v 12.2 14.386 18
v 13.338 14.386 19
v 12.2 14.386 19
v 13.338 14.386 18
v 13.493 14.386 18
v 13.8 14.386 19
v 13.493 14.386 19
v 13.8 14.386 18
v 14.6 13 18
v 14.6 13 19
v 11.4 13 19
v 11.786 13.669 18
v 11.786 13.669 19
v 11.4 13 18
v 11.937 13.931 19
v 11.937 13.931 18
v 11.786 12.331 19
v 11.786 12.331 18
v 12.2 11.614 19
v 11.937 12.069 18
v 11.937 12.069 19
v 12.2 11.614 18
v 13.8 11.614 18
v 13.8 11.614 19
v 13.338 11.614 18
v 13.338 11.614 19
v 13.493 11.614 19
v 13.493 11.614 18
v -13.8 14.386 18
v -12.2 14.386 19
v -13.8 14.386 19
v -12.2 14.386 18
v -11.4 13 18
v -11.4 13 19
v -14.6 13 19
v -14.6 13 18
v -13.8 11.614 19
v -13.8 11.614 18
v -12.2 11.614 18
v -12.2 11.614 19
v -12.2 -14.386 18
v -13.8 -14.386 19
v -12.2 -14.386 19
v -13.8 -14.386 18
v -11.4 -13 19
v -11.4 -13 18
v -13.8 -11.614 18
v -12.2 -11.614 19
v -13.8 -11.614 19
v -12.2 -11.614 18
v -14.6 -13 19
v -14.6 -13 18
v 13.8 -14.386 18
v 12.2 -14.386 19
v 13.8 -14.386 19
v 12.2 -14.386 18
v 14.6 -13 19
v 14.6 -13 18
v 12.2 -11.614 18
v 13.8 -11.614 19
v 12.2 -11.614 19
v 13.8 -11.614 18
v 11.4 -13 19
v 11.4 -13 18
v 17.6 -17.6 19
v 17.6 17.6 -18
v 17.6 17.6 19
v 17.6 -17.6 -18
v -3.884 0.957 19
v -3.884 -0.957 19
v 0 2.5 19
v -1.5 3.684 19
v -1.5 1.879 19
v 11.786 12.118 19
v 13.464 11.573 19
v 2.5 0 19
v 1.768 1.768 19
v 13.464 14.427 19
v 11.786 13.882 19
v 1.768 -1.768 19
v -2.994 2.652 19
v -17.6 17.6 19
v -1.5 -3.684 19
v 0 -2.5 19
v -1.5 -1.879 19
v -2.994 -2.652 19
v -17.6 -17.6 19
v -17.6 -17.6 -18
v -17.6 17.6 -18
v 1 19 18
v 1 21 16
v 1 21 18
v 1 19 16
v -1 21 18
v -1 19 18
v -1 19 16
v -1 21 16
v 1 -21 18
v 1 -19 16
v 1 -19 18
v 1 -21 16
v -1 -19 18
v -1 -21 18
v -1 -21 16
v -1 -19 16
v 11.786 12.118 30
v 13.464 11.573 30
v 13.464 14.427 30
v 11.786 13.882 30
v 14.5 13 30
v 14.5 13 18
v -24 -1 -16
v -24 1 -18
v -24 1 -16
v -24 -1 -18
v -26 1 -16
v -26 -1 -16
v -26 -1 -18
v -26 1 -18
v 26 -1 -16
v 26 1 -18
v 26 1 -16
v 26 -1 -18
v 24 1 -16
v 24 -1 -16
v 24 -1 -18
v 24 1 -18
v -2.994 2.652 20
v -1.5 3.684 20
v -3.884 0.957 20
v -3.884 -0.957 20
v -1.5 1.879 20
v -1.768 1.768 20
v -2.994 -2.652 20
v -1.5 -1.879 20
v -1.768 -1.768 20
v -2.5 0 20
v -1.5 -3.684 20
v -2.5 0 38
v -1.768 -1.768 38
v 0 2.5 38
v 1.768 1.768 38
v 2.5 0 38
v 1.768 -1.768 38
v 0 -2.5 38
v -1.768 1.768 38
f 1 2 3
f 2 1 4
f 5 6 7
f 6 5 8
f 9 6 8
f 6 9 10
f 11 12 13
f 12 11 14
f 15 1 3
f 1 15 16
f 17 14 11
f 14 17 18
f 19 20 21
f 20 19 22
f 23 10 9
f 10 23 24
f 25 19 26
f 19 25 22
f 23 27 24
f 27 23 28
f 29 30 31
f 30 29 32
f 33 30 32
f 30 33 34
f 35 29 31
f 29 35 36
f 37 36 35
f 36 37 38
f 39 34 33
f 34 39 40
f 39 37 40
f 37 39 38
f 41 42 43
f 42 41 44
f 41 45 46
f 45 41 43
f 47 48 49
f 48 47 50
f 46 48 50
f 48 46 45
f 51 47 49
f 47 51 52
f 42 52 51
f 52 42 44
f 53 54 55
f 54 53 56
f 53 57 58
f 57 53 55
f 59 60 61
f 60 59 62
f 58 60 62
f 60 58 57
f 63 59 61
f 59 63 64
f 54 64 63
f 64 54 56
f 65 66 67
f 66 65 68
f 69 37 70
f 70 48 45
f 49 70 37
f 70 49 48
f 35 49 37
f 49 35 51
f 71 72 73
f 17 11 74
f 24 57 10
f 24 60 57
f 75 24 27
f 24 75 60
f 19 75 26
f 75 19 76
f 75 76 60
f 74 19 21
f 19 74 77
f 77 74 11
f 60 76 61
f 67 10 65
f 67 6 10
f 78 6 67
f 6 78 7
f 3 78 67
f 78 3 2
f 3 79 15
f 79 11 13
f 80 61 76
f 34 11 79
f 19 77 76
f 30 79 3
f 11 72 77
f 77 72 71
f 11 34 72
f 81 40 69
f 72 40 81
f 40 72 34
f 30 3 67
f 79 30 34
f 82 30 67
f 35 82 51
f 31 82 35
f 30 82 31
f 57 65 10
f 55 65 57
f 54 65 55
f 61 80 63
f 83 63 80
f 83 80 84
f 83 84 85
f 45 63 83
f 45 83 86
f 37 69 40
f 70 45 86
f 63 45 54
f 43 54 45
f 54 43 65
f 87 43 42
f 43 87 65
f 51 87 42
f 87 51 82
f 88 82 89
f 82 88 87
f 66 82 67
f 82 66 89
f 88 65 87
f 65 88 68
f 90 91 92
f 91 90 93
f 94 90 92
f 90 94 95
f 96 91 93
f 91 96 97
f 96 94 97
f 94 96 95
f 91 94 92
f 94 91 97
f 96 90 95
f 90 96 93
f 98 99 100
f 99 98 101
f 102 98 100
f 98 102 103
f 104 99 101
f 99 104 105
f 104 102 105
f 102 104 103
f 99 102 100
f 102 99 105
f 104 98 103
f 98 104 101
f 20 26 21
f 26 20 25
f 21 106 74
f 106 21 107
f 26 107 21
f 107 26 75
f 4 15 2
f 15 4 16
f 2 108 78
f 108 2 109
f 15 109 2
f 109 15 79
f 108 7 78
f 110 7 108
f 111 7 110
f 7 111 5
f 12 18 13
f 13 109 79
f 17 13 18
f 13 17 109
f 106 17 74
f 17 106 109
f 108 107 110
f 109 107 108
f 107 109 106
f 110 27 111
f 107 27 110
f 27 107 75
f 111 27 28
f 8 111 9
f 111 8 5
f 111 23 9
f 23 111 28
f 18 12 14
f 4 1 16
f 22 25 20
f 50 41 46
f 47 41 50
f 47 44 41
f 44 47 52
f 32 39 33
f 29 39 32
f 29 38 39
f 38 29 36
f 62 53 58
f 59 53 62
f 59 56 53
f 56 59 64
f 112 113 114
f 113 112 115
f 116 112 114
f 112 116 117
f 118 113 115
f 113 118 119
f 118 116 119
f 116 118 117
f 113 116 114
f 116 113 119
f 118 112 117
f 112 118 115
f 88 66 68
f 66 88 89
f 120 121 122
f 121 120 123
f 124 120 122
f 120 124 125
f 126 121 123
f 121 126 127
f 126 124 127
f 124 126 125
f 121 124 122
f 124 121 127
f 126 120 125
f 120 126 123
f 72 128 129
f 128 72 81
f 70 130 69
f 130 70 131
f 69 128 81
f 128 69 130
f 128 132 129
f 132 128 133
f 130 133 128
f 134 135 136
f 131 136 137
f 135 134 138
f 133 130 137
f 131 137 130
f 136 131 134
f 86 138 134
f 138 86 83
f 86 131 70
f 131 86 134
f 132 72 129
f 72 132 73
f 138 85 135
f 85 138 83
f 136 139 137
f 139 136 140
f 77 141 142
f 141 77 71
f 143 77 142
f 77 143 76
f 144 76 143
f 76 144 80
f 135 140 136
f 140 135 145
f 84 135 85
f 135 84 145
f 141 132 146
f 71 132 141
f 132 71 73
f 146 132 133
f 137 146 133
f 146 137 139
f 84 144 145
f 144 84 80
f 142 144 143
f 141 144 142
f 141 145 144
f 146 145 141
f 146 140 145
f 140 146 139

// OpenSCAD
// Parameters
face_width = 35.2; //[17.6:70.4:0.1]
body_length = 36; //[18:72:0.1]
shaft_diameter = 5; //[2.5:10:0.1]
shaft_length = 20; //[5:40:0.1]
front_face_thickness = 2; //[0.5:6:0.1]
mounting_hole_spacing = 26; //[13:52:0.1]
mounting_hole_diameter = 3.2; //[2:6:0.1]
overlap = 1; //[0.5:2:0.1]
ref_diameter = 0.8; //[0.4:2:0.1]
ref_length = 6; //[2:20:0.5]
ttrack_length = 60; //[30:120:1]
ttrack_pitch = 20; //[10:40:1]
rail_length = 80; //[40:160:1]
rail_pitch = 25; //[10:50:1]
rail_hole_count = 3; //[2:8:1]
marker_size = 2; //[1:5:0.1]
screw_shank_diameter = 3; //[2:6:0.1]
screw_length = 12; //[6:30:0.5]
washer_outer_diameter = 7; //[4:14:0.1]
washer_thickness = 1; //[0.5:3:0.1]
d_plug_diameter = 8; //[4:16:0.1]
d_plug_thickness = 2; //[1:6:0.1]
d_flat_depth = 1.5; //[0.5:4:0.1]

// Derived Z references (centered model)
z_body_front =  body_length/2;
z_plate_center = z_body_front + front_face_thickness/2 - overlap; // overlaps into body
z_plate_front  = z_plate_center + front_face_thickness/2;

// Ttrack Hole Positions (markers only; keep attached by intersecting plate/body)
module ttrack_hole_positions() {
  color("Silver")
  union() {
    translate([0, ttrack_length/2 - (ttrack_length - 2*ttrack_pitch)/2, z_body_front - marker_size/2])
      cube([marker_size, marker_size, marker_size], center=true);
    translate([0, ttrack_length/2 - (ttrack_length - 2*ttrack_pitch)/2 - ttrack_pitch, z_body_front - marker_size/2])
      cube([marker_size, marker_size, marker_size], center=true);
    translate([0, ttrack_length/2 - (ttrack_length - 2*ttrack_pitch)/2 - 2*ttrack_pitch, z_body_front - marker_size/2])
      cube([marker_size, marker_size, marker_size], center=true);
  }
}

// Screw and Washer (ensure they start inside the face plate by overlap)
module screw_and_washer() {
  color("DimGray")
  union() {
    // Screw: bottom slightly inside plate
    translate([mounting_hole_spacing/2, mounting_hole_spacing/2,
               z_plate_front + screw_length/2 - overlap])
      cylinder(r=screw_shank_diameter/2, h=screw_length, center=true);

    // Washer: slightly embedded into plate
    translate([mounting_hole_spacing/2, mounting_hole_spacing/2,
               z_plate_front - washer_thickness/2 - overlap])
      cylinder(r=washer_outer_diameter/2, h=washer_thickness, center=true);
  }
}

// Rail Hole Positions (markers only; keep attached by intersecting body)
module rail_hole_positions() {
  color("Silver")
  union() {
    translate([(-rail_pitch*(rail_hole_count-1)/2), 0, -body_length/2 + marker_size/2])
      cube([marker_size, marker_size, marker_size], center=true);
    translate([(-rail_pitch*(rail_hole_count-1)/2) + rail_pitch, 0, -body_length/2 + marker_size/2])
      cube([marker_size, marker_size, marker_size], center=true);
    translate([(-rail_pitch*(rail_hole_count-1)/2) + 2*rail_pitch, 0, -body_length/2 + marker_size/2])
      cube([marker_size, marker_size, marker_size], center=true);
  }
}

// D Plug D (secondary small cylinder/pin) - FIXED: embed into face plate so it cannot float
module d_plug_D() {
  color("Copper")
  difference() {
    // Centered so its back face penetrates the plate by 'overlap'
    translate([0, 0, z_plate_front + d_plug_thickness/2 - overlap])
      cylinder(r=d_plug_diameter/2, h=d_plug_thickness, center=true);

    // Flat cut
    translate([d_plug_diameter/2 - d_flat_depth, 0, z_plate_front + d_plug_thickness/2 - overlap])
      cube([d_plug_diameter, d_plug_diameter, d_plug_thickness + 2*overlap], center=true);
  }
}

// Ttrack Insert Hole Positions (markers only; keep attached by intersecting plate/body)
module ttrack_insert_hole_positions() {
  color("Silver")
  union() {
    translate([0, ttrack_length/2 - (ttrack_length - ttrack_pitch)/2, z_body_front - marker_size/2])
      cube([marker_size, marker_size, marker_size], center=true);
    translate([0, ttrack_length/2 - (ttrack_length - ttrack_pitch)/2 - ttrack_pitch, z_body_front - marker_size/2])
      cube([marker_size, marker_size, marker_size], center=true);
  }
}

// Motor Assembly (single connected solid via union; all parts overlap 1-2mm)
module assembly() {
  union() {

    // Motor Body
    color("Black")
      cube([face_width, face_width, body_length], center=true);

    // Front Face Plate with Holes (plate overlaps into body)
    color("Silver")
    difference() {
      translate([0, 0, z_plate_center])
        cube([face_width, face_width, front_face_thickness], center=true);

      union() {
        translate([ mounting_hole_spacing/2,  mounting_hole_spacing/2, z_plate_center])
          cylinder(r=mounting_hole_diameter/2, h=front_face_thickness + 2*overlap, center=true);
        translate([-mounting_hole_spacing/2,  mounting_hole_spacing/2, z_plate_center])
          cylinder(r=mounting_hole_diameter/2, h=front_face_thickness + 2*overlap, center=true);
        translate([-mounting_hole_spacing/2, -mounting_hole_spacing/2, z_plate_center])
          cylinder(r=mounting_hole_diameter/2, h=front_face_thickness + 2*overlap, center=true);
        translate([ mounting_hole_spacing/2, -mounting_hole_spacing/2, z_plate_center])
          cylinder(r=mounting_hole_diameter/2, h=front_face_thickness + 2*overlap, center=true);
      }
    }

    // Output Shaft (back face penetrates plate by overlap)
    color("Silver")
      translate([0, 0, z_plate_front + shaft_length/2 - overlap])
        cylinder(r=shaft_diameter/2, h=shaft_length, center=true);

    // Reference Geometries (kept connected by embedding into plate/body)
    color("Red")
    union() {
      translate([0, 0, z_plate_center])
        cylinder(r=ref_diameter/2, h=ref_length, center=true);
      translate([0, 0, z_plate_center])
        cube([marker_size, marker_size, front_face_thickness], center=true);
    }

    // Mandatory Components (all positioned to intersect body/plate)
    ttrack_hole_positions();
    screw_and_washer();
    rail_hole_positions();
    d_plug_D();                 // FIXED: no gap; embedded into plate
    ttrack_insert_hole_positions();
  }
}

assembly();
